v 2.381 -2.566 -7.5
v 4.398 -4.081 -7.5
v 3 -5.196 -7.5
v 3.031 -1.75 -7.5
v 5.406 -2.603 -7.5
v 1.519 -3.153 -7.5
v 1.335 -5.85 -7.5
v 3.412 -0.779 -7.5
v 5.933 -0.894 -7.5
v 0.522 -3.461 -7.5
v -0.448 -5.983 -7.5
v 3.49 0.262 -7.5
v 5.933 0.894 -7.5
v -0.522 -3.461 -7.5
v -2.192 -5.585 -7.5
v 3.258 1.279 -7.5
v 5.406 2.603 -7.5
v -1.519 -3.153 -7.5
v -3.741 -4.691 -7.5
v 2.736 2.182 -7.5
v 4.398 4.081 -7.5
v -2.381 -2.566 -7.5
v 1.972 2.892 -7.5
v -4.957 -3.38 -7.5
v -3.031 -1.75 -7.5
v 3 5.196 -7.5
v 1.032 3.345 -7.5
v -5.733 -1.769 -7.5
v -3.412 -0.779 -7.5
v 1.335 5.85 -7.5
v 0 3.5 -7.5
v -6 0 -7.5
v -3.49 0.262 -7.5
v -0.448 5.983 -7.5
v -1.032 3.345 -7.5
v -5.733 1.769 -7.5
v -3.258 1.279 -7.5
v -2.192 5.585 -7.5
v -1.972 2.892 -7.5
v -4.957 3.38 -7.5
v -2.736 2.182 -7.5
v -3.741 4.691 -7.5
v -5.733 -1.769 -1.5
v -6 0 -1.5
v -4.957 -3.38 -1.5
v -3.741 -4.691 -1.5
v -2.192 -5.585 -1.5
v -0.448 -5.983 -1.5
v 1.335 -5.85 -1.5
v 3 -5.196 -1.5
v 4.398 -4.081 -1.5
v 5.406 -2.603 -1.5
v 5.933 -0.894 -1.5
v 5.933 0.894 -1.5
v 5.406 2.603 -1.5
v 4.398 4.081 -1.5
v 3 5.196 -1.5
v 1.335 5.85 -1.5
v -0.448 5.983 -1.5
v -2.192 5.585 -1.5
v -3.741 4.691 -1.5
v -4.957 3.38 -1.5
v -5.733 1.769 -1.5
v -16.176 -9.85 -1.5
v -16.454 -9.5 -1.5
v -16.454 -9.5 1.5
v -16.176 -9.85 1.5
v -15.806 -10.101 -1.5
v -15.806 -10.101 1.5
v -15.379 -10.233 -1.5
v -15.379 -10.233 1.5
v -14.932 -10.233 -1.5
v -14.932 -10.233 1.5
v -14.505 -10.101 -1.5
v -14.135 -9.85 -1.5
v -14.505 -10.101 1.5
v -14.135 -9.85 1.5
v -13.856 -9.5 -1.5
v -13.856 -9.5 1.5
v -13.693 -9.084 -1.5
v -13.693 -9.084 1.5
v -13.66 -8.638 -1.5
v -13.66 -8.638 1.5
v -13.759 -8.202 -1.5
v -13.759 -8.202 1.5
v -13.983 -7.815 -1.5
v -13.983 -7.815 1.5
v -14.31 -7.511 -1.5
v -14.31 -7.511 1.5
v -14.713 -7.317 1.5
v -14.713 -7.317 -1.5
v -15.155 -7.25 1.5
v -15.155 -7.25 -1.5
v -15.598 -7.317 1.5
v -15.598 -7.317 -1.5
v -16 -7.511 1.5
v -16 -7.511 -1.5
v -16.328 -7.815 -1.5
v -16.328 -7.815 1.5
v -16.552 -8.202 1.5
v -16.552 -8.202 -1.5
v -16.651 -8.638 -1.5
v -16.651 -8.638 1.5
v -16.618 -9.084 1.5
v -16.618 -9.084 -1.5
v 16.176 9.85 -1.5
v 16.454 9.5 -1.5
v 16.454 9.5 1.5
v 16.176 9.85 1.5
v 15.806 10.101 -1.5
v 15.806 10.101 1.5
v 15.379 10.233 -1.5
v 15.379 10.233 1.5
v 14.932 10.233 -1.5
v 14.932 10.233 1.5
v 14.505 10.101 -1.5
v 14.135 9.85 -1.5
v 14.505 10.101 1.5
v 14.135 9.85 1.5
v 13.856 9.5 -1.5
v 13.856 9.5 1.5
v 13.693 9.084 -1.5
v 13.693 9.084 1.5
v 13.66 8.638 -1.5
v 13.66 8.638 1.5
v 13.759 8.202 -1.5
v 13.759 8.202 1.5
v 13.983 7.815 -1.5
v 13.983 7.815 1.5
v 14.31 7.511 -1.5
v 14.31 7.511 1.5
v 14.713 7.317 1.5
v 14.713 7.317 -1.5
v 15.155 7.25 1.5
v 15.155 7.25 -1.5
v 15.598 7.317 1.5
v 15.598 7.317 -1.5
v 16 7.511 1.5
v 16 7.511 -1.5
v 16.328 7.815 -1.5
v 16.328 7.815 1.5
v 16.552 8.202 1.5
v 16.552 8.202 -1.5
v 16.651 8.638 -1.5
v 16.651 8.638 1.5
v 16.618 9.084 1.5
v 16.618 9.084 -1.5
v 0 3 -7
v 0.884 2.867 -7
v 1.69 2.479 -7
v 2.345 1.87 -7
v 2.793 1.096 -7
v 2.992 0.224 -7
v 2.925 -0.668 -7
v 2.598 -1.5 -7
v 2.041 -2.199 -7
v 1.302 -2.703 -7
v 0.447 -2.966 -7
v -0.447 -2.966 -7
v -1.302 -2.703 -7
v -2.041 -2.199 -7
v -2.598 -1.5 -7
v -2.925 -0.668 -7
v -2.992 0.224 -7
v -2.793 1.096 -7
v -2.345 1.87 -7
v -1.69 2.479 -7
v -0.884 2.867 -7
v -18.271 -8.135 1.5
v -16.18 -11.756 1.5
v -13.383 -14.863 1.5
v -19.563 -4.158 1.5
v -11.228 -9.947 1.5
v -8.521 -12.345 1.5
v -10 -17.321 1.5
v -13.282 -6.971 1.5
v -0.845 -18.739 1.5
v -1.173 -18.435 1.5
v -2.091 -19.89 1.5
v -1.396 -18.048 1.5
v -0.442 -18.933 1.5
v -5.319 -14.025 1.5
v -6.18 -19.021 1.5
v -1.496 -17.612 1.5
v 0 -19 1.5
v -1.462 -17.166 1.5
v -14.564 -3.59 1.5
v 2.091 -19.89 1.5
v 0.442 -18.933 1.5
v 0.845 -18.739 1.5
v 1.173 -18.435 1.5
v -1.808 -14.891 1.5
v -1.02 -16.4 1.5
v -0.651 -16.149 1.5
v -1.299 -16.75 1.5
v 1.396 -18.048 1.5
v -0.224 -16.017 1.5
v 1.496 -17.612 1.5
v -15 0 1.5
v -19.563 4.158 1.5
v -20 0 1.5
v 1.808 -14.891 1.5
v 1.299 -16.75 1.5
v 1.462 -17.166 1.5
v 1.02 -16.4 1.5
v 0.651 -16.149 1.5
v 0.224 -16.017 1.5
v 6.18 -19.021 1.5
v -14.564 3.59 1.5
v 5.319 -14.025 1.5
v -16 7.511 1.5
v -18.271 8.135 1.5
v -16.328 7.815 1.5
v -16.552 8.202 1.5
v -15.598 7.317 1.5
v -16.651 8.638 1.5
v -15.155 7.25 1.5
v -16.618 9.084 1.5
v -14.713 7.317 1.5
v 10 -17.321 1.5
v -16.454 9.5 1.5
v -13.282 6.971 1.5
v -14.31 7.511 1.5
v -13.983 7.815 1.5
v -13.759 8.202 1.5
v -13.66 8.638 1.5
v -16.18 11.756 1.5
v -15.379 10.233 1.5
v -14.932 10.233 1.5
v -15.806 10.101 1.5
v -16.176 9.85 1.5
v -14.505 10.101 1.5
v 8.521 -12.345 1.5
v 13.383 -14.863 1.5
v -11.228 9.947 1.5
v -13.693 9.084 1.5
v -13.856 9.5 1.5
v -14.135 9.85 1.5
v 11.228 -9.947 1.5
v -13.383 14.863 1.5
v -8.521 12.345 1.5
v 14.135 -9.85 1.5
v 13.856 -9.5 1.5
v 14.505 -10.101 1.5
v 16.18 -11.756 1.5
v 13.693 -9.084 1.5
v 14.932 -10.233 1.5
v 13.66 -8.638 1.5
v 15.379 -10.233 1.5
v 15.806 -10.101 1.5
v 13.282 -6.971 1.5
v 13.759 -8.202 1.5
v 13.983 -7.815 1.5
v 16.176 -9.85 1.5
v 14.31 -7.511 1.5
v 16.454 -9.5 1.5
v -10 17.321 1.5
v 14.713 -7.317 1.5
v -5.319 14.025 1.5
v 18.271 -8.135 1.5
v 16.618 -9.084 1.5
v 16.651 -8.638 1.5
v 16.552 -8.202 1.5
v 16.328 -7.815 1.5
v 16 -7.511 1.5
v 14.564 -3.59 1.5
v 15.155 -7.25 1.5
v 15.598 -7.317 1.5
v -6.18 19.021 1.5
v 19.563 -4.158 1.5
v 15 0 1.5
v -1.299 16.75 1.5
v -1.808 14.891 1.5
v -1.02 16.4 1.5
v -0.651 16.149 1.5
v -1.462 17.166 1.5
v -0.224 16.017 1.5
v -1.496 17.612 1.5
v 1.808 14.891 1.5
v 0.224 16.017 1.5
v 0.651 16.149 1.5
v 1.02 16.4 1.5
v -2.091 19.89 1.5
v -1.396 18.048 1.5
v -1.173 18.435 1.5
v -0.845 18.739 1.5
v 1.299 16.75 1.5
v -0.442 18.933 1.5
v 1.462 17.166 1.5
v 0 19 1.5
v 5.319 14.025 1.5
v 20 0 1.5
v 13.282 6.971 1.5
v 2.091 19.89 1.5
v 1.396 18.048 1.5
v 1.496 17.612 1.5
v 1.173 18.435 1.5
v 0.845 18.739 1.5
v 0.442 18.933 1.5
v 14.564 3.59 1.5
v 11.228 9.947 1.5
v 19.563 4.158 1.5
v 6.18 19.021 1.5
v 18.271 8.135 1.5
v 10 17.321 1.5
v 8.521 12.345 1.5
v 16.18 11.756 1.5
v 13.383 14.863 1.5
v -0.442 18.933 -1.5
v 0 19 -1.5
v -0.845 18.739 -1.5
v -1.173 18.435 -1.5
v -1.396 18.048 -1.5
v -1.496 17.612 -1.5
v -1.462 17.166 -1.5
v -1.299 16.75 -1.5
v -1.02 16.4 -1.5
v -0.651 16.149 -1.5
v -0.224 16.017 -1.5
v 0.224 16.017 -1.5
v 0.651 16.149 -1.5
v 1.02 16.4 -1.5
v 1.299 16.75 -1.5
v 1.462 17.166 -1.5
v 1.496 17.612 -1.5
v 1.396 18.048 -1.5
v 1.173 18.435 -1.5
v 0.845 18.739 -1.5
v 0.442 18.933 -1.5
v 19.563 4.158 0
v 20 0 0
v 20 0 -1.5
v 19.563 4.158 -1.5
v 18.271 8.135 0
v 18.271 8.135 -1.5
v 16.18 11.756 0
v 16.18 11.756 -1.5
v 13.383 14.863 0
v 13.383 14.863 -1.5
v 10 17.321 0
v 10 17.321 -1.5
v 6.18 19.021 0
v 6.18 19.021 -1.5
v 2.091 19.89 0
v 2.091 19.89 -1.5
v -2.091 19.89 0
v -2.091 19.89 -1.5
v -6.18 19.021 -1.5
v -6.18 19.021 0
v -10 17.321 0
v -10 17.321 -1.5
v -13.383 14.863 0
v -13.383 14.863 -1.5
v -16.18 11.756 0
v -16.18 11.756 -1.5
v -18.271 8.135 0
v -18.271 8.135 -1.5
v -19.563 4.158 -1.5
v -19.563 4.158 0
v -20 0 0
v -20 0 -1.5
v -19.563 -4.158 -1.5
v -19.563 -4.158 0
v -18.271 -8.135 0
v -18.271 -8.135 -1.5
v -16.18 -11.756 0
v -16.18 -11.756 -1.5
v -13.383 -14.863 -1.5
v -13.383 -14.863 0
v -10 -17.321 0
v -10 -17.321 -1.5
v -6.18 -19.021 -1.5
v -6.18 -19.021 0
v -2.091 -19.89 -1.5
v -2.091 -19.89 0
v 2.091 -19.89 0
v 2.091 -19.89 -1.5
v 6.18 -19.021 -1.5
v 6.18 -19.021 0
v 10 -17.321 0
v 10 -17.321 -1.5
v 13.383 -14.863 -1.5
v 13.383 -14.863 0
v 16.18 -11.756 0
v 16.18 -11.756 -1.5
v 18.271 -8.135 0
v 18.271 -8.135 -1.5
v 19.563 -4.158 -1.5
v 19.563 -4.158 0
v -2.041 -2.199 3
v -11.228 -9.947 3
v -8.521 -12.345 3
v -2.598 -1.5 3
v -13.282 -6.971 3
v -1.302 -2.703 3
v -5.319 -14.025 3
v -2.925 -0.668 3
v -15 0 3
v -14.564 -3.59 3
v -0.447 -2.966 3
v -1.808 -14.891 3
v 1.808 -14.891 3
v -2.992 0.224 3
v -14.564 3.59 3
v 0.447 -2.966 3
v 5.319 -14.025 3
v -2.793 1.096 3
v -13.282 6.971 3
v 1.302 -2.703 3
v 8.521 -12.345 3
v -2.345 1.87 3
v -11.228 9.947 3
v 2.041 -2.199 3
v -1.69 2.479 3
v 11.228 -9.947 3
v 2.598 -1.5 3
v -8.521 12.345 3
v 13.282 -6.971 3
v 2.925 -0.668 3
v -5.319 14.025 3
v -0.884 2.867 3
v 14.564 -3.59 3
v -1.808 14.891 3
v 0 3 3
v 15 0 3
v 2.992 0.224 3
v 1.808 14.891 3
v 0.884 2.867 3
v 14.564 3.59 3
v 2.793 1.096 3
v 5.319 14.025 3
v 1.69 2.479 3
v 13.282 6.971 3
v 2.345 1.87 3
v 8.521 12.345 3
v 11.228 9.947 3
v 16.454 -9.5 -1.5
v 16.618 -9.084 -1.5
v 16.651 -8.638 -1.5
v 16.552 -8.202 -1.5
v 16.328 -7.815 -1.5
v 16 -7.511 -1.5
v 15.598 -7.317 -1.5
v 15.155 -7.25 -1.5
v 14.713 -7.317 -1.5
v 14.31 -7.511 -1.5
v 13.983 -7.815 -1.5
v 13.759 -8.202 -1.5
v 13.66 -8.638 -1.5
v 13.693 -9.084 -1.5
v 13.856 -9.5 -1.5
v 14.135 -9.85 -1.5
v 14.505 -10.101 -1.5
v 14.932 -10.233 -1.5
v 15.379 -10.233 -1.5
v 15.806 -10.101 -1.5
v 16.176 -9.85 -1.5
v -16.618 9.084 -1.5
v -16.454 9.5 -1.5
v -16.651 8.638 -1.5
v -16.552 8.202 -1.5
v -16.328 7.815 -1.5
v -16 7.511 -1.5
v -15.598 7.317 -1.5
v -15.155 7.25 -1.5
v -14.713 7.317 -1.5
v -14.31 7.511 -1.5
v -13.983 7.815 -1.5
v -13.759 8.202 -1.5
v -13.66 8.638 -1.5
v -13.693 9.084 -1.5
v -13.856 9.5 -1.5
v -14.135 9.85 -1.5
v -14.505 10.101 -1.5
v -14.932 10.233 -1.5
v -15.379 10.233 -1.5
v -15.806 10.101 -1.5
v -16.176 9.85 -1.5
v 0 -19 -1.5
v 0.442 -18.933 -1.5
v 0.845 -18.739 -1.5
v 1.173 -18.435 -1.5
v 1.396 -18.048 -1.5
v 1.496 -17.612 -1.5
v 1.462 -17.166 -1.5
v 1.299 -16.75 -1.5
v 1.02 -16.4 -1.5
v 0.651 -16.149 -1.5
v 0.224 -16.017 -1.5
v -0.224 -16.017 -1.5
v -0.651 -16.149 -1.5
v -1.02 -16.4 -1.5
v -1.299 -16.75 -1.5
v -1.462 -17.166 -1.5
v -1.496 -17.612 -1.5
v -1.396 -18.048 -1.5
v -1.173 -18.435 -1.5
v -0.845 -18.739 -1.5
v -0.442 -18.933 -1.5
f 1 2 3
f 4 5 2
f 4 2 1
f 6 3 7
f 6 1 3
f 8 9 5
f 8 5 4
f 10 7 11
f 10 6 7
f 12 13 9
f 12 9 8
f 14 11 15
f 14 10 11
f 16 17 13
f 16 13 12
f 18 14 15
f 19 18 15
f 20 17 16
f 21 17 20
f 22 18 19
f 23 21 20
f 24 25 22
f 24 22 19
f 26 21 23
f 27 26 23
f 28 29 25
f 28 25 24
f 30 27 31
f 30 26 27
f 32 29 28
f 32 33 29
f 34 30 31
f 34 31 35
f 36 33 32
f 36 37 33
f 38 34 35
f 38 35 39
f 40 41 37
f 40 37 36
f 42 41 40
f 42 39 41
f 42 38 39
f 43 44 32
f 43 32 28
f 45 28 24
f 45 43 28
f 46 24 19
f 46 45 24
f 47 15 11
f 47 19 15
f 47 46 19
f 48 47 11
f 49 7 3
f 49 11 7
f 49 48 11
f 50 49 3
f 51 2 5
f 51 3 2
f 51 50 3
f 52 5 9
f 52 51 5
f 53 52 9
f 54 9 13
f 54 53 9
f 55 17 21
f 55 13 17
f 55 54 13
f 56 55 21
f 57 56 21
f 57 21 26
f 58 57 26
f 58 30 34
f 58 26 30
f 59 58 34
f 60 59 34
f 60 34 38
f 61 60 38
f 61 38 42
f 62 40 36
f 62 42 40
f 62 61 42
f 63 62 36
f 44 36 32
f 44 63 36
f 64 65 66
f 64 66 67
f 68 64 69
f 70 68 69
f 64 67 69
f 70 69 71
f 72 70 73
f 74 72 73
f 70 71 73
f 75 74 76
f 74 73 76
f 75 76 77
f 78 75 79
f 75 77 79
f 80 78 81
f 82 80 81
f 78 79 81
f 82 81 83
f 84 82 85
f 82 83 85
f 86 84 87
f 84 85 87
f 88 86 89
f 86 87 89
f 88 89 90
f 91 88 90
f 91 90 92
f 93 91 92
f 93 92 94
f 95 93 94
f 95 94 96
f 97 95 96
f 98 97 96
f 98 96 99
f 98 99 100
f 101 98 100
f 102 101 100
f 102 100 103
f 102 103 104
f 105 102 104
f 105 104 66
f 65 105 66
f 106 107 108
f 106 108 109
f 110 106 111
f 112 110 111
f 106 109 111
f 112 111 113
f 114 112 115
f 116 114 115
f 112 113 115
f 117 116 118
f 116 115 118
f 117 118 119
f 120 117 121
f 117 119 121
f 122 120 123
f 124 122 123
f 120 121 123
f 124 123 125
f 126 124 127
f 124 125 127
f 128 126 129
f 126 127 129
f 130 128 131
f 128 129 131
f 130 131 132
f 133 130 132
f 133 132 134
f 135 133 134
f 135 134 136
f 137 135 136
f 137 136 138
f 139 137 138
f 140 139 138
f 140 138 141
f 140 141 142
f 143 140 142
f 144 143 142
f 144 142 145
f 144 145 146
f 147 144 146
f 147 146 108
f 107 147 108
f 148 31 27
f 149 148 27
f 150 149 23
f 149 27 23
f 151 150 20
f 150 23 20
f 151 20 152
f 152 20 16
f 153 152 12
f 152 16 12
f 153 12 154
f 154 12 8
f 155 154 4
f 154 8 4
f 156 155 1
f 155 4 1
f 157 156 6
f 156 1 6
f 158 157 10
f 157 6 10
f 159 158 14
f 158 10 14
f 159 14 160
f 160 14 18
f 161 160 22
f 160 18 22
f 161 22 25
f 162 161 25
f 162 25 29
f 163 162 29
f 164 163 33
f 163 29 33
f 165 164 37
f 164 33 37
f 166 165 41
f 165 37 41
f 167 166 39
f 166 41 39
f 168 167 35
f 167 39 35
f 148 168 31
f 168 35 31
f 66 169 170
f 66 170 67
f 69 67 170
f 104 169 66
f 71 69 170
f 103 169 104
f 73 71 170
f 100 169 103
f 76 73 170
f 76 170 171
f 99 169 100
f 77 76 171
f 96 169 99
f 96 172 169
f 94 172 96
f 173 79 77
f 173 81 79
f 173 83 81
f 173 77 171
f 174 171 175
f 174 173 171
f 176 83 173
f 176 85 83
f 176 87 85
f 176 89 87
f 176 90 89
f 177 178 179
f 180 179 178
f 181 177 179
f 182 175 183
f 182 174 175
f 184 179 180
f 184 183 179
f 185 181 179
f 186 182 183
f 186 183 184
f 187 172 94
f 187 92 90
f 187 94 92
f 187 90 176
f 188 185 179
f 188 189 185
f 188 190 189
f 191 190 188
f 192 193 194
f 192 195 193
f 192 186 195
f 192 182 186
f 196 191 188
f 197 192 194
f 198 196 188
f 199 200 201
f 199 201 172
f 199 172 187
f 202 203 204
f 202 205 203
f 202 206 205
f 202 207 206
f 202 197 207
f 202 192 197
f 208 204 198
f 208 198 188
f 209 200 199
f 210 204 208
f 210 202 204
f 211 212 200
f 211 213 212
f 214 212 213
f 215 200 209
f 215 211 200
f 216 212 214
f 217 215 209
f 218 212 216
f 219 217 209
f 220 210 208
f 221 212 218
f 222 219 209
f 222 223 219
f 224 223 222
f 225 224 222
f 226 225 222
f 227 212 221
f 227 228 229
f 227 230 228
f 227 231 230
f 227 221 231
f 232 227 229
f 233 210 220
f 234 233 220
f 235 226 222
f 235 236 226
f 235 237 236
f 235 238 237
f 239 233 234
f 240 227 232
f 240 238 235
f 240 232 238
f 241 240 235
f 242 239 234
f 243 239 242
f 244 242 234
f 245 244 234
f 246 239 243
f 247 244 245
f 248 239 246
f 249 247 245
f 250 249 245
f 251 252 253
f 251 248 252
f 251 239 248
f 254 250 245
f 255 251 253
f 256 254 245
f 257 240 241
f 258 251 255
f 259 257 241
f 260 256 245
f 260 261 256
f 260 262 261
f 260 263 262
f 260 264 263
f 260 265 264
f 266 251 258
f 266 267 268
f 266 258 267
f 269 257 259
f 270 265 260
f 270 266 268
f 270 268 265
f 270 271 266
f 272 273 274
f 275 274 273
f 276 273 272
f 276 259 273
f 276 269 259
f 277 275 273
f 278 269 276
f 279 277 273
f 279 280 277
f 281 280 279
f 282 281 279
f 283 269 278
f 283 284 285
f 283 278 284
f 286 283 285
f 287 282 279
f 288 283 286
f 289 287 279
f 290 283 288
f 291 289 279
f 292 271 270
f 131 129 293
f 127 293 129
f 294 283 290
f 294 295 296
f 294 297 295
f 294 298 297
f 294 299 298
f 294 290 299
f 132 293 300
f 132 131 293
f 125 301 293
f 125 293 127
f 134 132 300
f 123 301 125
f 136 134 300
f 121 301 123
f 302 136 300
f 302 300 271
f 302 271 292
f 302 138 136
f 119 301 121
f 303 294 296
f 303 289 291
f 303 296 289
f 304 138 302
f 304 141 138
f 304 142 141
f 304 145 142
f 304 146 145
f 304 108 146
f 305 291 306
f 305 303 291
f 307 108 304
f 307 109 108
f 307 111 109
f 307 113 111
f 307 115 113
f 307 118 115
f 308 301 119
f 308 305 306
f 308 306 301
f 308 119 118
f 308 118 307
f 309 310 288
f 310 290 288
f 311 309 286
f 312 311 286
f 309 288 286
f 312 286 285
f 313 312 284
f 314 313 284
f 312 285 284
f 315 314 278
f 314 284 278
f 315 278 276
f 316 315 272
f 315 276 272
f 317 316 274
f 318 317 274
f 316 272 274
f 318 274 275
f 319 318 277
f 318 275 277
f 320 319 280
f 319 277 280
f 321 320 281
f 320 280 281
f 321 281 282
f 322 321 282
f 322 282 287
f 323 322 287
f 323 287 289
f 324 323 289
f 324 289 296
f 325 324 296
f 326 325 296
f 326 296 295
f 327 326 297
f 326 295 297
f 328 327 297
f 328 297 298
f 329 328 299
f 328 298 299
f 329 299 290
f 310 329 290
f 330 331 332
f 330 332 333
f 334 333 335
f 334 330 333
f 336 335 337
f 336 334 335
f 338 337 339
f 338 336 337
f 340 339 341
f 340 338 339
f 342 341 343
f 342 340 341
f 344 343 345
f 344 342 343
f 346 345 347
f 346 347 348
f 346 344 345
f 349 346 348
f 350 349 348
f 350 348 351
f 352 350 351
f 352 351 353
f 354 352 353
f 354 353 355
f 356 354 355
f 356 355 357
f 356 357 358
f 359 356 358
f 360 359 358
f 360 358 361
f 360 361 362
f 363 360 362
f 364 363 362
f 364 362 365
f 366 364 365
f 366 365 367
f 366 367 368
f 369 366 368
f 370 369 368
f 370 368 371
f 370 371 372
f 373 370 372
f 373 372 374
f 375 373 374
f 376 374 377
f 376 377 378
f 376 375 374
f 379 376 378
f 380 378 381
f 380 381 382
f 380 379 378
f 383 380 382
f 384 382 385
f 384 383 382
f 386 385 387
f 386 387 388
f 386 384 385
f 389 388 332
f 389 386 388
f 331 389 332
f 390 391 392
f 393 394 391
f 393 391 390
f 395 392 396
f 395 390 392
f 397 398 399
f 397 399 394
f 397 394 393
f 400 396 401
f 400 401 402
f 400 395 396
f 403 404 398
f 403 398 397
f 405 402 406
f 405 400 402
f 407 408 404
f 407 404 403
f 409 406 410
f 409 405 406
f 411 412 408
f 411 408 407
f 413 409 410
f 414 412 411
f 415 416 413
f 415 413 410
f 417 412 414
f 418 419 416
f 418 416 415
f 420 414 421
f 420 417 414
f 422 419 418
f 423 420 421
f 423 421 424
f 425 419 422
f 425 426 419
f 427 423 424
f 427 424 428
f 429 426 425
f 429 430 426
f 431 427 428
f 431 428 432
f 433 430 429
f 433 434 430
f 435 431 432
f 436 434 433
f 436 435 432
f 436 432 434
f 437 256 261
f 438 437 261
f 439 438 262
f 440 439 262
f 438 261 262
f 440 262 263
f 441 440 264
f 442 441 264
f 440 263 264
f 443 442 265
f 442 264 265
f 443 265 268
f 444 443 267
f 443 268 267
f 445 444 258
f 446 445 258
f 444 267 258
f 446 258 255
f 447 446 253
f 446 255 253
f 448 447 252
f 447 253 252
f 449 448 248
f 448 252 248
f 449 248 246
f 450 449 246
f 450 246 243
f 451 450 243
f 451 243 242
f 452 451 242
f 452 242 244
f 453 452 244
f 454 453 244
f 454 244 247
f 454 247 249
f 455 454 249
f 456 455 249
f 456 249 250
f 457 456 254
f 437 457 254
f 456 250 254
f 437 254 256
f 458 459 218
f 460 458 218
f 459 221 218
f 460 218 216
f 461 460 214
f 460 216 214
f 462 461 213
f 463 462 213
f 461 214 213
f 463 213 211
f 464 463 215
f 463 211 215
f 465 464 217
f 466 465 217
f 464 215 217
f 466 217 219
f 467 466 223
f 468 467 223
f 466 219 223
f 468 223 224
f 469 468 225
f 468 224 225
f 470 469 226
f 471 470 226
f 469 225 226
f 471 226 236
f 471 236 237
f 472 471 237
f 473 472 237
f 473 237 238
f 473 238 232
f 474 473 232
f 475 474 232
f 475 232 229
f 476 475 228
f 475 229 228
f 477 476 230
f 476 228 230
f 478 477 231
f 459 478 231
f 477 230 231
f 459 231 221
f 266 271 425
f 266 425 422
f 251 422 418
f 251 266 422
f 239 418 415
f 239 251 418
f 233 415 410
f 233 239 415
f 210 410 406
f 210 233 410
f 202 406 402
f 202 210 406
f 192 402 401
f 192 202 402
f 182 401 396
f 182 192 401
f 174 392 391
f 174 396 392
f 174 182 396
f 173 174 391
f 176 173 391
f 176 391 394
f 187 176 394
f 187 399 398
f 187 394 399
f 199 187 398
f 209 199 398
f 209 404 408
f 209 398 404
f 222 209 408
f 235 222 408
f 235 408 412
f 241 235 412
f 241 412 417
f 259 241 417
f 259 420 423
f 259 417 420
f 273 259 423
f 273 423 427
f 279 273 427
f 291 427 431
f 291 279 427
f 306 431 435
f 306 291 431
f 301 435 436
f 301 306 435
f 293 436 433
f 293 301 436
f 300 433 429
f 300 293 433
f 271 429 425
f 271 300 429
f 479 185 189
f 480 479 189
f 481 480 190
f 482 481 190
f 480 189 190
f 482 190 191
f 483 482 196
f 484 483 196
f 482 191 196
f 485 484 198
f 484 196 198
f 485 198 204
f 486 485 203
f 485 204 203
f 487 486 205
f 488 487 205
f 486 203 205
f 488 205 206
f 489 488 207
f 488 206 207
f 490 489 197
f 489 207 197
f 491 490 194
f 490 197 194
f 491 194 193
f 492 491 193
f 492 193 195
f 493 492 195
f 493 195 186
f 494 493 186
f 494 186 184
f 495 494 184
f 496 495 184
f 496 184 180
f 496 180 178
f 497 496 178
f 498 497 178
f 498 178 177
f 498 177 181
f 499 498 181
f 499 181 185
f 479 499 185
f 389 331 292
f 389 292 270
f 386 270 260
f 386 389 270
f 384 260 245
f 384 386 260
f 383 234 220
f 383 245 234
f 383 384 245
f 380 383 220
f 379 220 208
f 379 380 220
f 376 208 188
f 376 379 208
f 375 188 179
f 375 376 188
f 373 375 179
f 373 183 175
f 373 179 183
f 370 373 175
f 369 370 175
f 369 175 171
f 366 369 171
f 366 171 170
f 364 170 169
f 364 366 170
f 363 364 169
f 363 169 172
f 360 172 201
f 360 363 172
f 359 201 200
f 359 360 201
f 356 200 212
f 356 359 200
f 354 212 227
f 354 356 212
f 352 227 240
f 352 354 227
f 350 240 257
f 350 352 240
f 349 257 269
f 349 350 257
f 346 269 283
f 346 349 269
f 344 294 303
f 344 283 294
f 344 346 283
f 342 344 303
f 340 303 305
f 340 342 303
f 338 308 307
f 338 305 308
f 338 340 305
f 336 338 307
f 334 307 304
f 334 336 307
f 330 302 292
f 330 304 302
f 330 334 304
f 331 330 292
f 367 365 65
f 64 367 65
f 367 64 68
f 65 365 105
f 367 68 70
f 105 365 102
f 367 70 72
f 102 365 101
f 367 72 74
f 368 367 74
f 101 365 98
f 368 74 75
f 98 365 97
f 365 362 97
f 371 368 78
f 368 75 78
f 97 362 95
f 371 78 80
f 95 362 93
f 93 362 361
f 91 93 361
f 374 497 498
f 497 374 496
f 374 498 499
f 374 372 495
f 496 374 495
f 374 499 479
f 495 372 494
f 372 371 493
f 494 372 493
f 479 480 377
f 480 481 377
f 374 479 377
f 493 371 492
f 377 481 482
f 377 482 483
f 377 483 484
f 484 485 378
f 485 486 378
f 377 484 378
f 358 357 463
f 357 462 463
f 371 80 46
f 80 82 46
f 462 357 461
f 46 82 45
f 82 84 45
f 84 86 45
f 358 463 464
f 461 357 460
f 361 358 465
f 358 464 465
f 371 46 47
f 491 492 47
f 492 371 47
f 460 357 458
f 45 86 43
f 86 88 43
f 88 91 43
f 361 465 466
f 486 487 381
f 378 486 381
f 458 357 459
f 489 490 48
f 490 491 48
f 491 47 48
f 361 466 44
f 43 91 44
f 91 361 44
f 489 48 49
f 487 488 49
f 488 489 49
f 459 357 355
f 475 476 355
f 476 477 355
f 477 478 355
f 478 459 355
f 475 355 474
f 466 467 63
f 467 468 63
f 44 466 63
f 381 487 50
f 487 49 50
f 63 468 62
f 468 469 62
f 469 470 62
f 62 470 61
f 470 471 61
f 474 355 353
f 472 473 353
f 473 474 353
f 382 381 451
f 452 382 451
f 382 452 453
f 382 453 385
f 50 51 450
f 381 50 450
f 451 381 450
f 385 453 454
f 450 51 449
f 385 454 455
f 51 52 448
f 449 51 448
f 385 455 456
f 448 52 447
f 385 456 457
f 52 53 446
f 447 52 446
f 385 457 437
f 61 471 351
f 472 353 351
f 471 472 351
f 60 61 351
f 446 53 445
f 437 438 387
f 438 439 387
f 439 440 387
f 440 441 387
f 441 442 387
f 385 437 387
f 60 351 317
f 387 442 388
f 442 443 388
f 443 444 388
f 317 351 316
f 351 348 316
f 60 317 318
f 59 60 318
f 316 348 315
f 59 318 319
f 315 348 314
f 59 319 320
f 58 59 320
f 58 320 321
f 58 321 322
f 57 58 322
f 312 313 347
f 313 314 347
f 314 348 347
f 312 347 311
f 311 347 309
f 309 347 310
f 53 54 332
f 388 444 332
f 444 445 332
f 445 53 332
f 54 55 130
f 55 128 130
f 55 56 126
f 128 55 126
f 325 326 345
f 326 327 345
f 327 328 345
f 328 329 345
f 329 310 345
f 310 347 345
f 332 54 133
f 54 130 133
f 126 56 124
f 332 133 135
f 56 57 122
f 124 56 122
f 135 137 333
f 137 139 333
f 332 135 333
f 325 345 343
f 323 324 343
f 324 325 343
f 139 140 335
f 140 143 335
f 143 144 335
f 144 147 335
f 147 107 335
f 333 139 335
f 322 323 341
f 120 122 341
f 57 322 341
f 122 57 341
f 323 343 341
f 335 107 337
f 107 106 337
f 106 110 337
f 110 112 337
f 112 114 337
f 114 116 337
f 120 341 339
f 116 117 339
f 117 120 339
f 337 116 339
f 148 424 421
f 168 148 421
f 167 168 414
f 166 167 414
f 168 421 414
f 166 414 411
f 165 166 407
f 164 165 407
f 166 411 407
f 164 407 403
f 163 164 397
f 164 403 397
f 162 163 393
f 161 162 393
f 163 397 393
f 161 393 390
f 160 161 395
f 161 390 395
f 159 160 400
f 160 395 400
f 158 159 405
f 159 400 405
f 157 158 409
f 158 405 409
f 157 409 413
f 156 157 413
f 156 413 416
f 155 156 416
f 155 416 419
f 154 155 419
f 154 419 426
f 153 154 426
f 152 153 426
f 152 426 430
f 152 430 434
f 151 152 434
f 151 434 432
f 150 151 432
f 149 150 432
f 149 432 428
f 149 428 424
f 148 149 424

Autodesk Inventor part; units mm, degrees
ref_plane "YZ Plane" through (0, 0, 0) normal (1, 0, 0) x (0, 1, 0)
ref_plane "XZ Plane" through (0, 0, 0) normal (0, 1, 0) x (-1, 0, 0)
ref_plane "XY Plane" through (0, 0, 0) normal (0, 0, 1) x (1, 0, 0)
sketch "Sketch1" plane through (0, 0, 0) normal (0, 0, 1) x (1, 0, 0)
  circle A0 centre (0, 0) radius 20
  dimension "d0" = 40
extrude "Extrusion1" add sketch "Sketch1" along normal mid plane 3
sketch "Sketch2" plane through (0, 0, 1.5) normal (0, 0, 1) x (1, 0, 0)
  circle A0 centre (0, 0) radius 15
  dimension "d3" = 30
extrude "Extrusion2" add sketch "Sketch2" along normal blind 1.5
sketch "Sketch3" plane through (0, 0, -1.5) normal (0, 0, -1) x (-1, 0, 0)
  circle A0 centre (0, 0) radius 17.5 construction
  point P0 (0, 17.5)
  dimension "d6" = 35
hole "Hole1" at (0, 17.5, -1.5) direction (0, 0, 1) diameter 3 depth 3
pattern_circular "Circular Pattern1" count 6 over 360 about axis through (0, 0, 0) along (0, 0, 1) of "Hole1"
sketch "Sketch4" plane through (0, 0, -1.5) normal (0, 0, -1) x (-1, 0, 0)
  circle A0 centre (0, 0) radius 6
  dimension "d17" = 12
extrude "Extrusion3" add sketch "Sketch4" along normal blind 6
thread "Thread1" size "M12x1.75" class "6g" standard "ISO Metric profile" full length
sketch "Sketch8" plane through (0, 0, -7.5) normal (0, 0, -1) x (-1, 0, 0)
  circle A0 centre (0, 0) radius 6 projected
hole "Hole5" at (0, 0, -7.5) direction (0, 0, 1) diameter 6 depth 10.5 countersink diameter 7 countersink angle 90
properties part number "14"
